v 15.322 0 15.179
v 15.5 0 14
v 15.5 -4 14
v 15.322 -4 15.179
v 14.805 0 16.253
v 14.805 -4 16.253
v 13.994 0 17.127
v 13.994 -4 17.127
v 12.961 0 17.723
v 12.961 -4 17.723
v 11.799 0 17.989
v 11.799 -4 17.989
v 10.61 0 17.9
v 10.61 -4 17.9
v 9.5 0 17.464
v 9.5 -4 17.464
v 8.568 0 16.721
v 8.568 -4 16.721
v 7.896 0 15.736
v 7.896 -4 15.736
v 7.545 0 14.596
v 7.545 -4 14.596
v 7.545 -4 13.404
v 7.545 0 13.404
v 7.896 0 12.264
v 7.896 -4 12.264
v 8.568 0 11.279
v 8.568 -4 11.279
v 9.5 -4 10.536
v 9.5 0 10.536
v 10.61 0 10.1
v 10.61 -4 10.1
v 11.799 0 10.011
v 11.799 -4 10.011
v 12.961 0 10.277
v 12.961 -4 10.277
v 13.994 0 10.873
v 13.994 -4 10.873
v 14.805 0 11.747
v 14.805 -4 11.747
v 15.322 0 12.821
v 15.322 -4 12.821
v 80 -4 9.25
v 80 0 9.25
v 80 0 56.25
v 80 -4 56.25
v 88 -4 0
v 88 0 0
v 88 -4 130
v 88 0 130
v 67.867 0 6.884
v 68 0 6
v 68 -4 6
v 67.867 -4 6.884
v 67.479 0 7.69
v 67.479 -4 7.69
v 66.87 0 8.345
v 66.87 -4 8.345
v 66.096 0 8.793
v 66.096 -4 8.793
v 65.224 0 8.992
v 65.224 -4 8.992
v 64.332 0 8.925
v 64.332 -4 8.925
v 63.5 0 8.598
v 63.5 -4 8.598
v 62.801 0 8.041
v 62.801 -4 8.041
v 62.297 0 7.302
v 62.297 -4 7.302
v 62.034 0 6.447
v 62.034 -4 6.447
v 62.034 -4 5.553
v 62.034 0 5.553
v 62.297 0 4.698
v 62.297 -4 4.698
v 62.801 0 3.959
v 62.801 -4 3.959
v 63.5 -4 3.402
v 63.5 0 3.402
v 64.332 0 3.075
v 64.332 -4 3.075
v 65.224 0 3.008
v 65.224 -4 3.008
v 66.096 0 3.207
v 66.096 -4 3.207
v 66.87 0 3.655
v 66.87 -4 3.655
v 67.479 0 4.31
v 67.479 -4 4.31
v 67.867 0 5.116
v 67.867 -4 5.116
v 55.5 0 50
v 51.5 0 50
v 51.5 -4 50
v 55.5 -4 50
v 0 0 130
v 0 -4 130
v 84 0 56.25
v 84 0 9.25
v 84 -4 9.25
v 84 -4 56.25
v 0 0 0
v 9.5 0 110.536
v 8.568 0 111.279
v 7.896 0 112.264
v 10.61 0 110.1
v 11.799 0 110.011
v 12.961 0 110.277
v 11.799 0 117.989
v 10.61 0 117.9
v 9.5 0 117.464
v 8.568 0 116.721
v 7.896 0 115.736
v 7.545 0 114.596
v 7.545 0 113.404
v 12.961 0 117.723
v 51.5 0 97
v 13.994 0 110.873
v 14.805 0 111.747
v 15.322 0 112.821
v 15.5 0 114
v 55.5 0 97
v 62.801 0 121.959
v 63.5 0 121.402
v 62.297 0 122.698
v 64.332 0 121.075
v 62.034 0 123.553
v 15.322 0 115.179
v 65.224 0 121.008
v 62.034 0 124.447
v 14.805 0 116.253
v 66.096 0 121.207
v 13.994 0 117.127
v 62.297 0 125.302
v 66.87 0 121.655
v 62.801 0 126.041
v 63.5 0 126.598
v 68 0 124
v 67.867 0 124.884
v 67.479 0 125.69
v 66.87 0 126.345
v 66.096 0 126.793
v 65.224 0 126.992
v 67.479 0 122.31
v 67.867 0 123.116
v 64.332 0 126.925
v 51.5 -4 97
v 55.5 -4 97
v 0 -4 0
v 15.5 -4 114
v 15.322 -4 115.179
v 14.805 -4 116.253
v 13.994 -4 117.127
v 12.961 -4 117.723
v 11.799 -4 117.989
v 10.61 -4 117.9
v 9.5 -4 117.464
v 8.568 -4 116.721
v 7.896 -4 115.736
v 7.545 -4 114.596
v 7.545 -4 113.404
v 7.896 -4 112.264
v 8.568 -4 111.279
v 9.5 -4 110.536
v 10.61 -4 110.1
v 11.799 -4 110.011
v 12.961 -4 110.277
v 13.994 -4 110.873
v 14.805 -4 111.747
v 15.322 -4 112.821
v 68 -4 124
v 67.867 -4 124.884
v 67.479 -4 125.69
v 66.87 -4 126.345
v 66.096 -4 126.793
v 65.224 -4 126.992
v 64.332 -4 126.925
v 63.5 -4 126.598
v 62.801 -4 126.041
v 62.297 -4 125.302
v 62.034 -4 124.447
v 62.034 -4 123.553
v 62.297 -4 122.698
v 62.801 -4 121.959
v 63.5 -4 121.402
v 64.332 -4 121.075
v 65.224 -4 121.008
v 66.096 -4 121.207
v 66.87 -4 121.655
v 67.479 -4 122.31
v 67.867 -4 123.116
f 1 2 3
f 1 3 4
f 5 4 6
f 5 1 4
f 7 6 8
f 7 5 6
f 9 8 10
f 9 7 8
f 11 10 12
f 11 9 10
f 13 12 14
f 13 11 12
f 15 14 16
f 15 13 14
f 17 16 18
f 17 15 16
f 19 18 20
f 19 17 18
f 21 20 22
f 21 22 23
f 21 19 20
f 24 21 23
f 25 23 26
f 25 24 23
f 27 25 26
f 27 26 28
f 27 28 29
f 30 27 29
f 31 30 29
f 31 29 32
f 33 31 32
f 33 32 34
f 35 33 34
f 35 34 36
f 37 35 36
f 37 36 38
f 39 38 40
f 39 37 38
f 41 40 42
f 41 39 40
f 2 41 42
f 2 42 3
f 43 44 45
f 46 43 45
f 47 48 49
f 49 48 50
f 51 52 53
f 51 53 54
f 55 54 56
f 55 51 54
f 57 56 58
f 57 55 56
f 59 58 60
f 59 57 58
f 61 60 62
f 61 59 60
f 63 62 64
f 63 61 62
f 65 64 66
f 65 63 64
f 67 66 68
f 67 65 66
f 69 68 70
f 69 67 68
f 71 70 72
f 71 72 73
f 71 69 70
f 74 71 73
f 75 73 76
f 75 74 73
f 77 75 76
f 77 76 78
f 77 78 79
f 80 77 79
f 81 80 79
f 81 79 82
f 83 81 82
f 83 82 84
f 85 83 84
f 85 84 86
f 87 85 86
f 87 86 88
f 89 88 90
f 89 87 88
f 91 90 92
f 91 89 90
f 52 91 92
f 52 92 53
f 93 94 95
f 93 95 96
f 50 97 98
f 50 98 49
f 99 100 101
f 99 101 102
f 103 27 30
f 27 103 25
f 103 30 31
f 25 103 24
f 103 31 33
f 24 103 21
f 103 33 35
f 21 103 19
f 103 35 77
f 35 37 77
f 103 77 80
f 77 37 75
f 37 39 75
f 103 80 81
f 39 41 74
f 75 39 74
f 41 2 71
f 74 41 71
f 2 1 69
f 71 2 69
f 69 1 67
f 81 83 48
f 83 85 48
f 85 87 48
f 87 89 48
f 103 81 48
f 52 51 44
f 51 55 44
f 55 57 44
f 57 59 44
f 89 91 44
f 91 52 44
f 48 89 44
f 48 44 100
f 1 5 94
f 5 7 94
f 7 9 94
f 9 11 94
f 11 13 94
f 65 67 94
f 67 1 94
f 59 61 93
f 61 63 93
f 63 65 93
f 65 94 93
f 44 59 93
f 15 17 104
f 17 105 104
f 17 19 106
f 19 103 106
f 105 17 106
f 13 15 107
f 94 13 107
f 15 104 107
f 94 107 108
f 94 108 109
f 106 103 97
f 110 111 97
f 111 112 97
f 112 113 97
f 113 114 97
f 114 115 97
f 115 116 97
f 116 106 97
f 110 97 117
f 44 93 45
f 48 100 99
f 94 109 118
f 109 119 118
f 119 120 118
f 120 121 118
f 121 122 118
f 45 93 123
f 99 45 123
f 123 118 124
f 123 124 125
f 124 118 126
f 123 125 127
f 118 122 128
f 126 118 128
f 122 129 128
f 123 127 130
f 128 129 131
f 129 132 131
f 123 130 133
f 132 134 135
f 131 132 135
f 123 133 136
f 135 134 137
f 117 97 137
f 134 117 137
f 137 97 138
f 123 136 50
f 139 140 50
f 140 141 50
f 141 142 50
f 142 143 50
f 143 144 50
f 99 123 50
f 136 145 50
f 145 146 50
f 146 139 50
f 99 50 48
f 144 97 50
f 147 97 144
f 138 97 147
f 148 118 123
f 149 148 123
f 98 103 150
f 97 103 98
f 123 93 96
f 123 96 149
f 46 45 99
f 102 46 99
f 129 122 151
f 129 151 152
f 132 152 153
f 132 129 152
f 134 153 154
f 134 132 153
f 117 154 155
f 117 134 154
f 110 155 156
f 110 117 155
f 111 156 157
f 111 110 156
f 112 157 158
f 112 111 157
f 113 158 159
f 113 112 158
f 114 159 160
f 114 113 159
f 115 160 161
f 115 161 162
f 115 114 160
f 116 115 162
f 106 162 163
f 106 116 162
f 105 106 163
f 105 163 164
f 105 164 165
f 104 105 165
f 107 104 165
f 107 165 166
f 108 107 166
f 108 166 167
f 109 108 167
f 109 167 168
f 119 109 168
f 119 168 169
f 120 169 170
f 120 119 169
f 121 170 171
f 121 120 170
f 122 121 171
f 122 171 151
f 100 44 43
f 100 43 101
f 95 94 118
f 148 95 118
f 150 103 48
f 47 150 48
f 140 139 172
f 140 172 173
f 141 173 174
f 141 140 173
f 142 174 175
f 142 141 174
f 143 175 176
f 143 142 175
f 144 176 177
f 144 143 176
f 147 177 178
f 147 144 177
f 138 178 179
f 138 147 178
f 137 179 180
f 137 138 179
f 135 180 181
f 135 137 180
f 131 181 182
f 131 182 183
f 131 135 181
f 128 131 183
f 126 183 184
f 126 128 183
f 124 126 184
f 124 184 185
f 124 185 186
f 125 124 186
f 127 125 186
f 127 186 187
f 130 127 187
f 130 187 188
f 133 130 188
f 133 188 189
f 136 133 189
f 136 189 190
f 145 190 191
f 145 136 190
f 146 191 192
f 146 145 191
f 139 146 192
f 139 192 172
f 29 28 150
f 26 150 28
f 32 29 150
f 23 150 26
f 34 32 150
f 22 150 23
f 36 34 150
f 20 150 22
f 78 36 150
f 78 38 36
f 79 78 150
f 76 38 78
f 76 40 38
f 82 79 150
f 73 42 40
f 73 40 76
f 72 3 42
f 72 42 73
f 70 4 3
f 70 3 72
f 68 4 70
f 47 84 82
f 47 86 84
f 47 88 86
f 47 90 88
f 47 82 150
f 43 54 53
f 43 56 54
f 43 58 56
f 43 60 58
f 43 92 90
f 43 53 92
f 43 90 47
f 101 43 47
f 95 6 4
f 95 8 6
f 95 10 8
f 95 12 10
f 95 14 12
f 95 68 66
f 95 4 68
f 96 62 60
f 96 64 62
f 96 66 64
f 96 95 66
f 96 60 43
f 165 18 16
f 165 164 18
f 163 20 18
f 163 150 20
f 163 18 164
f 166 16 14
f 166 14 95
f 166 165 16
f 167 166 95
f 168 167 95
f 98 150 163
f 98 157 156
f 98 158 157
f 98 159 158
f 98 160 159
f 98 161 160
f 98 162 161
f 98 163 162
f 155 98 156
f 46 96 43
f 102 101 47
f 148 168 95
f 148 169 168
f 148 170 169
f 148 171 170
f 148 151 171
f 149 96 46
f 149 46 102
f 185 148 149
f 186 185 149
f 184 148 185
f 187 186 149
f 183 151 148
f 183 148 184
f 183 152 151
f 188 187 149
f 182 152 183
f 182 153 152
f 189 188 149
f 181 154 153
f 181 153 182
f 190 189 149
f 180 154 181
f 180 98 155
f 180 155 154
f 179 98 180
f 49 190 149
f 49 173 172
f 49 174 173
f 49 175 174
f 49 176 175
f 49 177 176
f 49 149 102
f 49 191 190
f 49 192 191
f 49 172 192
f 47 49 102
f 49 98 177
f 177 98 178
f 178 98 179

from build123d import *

# Parameters (mm, degrees)
F0_W     = 88
F0_H     = 130
F0_R     = 4
F0_R_2   = 3
F0_W_2   = 4
F0_H_2   = 47
F1_DEPTH = 4


with BuildPart() as f1:
    # F0 (on Front) → F1 (new body)
    with BuildSketch(Plane.XZ):
        with Locations((44, 65)):
            Rectangle(F0_W, F0_H)
        with Locations((11.5, 14)):
            Circle(F0_R, mode=Mode.SUBTRACT)
        with Locations((65, 6)):
            Circle(F0_R_2, mode=Mode.SUBTRACT)
        with Locations((82, 32.75)):
            Rectangle(F0_W_2, F0_H_2, mode=Mode.SUBTRACT)
        with Locations((11.5, 114)):
            Circle(F0_R, mode=Mode.SUBTRACT)
        with Locations((53.5, 73.5)):
            Rectangle(F0_W_2, F0_H_2, mode=Mode.SUBTRACT)
        with Locations((65, 124)):
            Circle(F0_R_2, mode=Mode.SUBTRACT)
    extrude(amount=F1_DEPTH)


solid = f1.part
